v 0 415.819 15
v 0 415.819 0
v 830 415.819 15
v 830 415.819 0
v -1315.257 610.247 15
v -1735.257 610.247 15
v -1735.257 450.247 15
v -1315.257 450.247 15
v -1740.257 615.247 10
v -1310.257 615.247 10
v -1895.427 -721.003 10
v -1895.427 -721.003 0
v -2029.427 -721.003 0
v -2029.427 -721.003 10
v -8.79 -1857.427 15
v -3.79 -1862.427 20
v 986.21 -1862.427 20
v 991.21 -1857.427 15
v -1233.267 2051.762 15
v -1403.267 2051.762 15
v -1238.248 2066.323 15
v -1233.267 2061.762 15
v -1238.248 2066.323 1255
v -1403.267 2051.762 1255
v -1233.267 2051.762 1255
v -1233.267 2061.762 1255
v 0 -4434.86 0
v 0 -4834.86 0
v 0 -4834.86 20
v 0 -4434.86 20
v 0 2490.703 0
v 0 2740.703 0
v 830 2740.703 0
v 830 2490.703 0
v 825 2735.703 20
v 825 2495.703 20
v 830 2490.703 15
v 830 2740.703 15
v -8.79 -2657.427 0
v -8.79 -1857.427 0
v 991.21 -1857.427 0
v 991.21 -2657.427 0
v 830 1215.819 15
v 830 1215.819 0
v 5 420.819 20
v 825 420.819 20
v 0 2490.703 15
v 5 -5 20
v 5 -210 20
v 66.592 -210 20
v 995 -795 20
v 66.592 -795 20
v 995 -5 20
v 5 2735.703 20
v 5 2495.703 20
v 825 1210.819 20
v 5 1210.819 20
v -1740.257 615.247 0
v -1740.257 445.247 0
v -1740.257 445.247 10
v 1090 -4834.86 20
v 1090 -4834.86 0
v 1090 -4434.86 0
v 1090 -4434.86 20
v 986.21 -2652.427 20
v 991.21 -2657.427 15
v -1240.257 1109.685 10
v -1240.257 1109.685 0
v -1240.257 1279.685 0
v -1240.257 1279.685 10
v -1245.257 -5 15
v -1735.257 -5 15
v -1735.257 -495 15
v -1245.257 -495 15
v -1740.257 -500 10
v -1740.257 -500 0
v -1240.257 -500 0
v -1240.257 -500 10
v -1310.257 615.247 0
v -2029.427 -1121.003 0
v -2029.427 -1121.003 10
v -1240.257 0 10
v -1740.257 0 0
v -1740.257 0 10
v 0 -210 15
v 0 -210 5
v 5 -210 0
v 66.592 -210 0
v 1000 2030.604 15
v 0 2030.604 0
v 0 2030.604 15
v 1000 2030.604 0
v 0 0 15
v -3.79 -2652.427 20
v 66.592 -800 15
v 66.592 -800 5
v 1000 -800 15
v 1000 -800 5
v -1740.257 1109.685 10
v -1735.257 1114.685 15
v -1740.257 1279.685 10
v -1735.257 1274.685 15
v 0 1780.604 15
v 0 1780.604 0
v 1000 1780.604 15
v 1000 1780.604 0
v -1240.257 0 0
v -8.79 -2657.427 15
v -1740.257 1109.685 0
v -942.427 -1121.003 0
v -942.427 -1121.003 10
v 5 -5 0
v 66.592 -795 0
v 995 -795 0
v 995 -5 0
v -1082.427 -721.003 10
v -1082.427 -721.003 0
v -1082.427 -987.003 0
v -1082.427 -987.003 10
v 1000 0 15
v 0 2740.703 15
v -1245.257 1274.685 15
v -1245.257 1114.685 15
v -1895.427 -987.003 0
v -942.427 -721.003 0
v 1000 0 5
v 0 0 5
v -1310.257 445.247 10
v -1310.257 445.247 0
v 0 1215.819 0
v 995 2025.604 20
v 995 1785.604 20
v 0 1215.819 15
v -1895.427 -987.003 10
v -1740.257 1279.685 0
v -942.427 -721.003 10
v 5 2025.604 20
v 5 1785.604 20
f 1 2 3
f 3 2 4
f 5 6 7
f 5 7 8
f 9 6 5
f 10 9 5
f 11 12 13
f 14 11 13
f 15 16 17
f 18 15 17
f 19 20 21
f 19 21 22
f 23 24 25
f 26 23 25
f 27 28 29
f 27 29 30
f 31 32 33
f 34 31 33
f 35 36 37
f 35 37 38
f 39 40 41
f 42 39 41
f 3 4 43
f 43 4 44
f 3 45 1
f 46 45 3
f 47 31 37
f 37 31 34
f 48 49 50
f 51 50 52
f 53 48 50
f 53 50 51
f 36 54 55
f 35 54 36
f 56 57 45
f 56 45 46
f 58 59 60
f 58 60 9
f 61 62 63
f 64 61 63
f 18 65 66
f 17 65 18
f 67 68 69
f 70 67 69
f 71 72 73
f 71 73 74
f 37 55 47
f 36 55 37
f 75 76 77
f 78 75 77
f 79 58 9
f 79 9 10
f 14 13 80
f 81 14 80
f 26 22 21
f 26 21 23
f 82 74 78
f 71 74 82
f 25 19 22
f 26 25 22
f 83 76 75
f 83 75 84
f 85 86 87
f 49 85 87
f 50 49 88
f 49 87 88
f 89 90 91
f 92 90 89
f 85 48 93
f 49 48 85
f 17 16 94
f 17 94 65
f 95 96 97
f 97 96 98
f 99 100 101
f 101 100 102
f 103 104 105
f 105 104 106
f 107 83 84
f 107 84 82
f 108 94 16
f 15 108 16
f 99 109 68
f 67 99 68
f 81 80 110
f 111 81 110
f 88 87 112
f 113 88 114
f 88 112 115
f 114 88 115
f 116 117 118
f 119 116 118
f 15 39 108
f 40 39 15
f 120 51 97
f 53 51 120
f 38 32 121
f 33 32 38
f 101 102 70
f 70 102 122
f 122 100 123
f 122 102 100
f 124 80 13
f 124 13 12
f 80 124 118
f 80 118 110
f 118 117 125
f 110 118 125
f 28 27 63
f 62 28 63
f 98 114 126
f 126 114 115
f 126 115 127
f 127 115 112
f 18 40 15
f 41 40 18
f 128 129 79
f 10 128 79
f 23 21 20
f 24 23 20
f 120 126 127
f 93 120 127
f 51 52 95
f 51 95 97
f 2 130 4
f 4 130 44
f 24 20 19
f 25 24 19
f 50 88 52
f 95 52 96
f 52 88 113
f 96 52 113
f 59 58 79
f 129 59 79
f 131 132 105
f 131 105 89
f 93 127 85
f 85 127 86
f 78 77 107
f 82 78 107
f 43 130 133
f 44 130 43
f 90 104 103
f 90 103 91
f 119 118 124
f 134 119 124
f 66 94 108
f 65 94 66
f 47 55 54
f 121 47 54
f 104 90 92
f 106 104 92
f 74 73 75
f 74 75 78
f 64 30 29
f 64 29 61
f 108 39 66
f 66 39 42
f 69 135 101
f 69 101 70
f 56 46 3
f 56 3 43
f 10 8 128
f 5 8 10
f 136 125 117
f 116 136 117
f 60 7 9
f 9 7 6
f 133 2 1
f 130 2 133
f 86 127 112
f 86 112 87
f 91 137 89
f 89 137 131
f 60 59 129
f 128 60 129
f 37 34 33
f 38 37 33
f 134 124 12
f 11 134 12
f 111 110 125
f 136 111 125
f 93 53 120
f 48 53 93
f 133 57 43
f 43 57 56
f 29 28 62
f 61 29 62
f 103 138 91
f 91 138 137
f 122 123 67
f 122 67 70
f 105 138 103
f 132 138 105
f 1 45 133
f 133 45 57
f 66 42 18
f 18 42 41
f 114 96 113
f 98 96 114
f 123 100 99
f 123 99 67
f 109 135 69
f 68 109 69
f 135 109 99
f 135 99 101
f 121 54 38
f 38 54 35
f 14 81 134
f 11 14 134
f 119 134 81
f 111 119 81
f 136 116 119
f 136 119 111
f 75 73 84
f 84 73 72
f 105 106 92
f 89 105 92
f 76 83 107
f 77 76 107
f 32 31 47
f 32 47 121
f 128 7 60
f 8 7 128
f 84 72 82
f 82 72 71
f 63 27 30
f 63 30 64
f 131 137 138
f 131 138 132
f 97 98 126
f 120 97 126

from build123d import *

# Parameters (mm, degrees)
F1_DEPTH  = 20
F2_SIZE   = 5
F3_SIZE   = 5
F4_W      = 830
F4_H      = 800
F5_DEPTH  = 20
F6_W      = 1000
F6_H      = 250
F7_DEPTH  = 20
F8_SIZE   = 5
F9_SIZE   = 5
F10_W     = 830
F10_H     = 250
F11_DEPTH = 20
F12_SIZE  = 5
F13_W     = 1000
F13_H     = 800
F14_DEPTH = 20
F15_SIZE  = 5
F16_W     = 500
F16_H     = 500
F16_W_2   = 430
F16_H_2   = 170
F17_DEPTH = 15
F18_SIZE  = 5
F19_SIZE  = 5
F20_SIZE  = 5
F22_DEPTH = 1240
F23_SIZE  = 5
F25_DEPTH = 10
F26_W     = 1090
F26_H     = 400
F27_DEPTH = 20


with BuildPart() as f1:
    # F0 (on Top) → F1 (new body)
    with BuildSketch(Plane.XY):
        Polygon((1000, 0), (0, 0), (0, -210), (66.591531, -210), (66.591531, -800), (1000, -800), align=None)
    extrude(amount=F1_DEPTH)

    # F2
    f2_edges = [f1.edges().sort_by_distance(p)[0] for p in [
        (0, -105, 20),
        (500, 0, 20),
        (533.295766, -800, 20),
        (1000, -400, 20),
    ]]
    chamfer(f2_edges, length=F2_SIZE)

    # F3
    f3_edges = [f1.edges().sort_by_distance(p)[0] for p in [
        (1000, -400, 0),
        (533.295766, -800, 0),
        (0, -105, 0),
        (500, 0, 0),
    ]]
    chamfer(f3_edges, length=F3_SIZE)


with BuildPart() as f5:
    # F4 (on Top) → F5 (new body)
    with BuildSketch(Plane.XY):
        with Locations((415, 815.819019)):
            Rectangle(F4_W, F4_H)
    extrude(amount=F5_DEPTH)

    # F8
    f8_edges = [f5.edges().sort_by_distance(p)[0] for p in [
        (415, 1215.819019, 20),
        (0, 815.819019, 20),
        (415, 415.819019, 20),
        (830, 815.819019, 20),
    ]]
    chamfer(f8_edges, length=F8_SIZE)


with BuildPart() as f7:
    # F6 (on Top) → F7 (new body)
    with BuildSketch(Plane.XY):
        with Locations((500, 1905.604243)):
            Rectangle(F6_W, F6_H)
    extrude(amount=F7_DEPTH)

    # F9
    f9_edges = [f7.edges().sort_by_distance(p)[0] for p in [
        (1000, 1905.604243, 20),
        (500, 2030.604243, 20),
        (0, 1905.604243, 20),
        (500, 1780.604243, 20),
    ]]
    chamfer(f9_edges, length=F9_SIZE)


with BuildPart() as f11:
    # F10 (on Top) → F11 (new body)
    with BuildSketch(Plane.XY):
        with Locations((415, 2615.703106)):
            Rectangle(F10_W, F10_H)
    extrude(amount=F11_DEPTH)

    # F12
    f12_edges = [f11.edges().sort_by_distance(p)[0] for p in [
        (415, 2740.703106, 20),
        (0, 2615.703106, 20),
        (415, 2490.703106, 20),
        (830, 2615.703106, 20),
    ]]
    chamfer(f12_edges, length=F12_SIZE)


with BuildPart() as f14:
    # F13 (on Top) → F14 (new body)
    with BuildSketch(Plane.XY):
        with Locations((491.210267, -2257.426834)):
            Rectangle(F13_W, F13_H)
    extrude(amount=F14_DEPTH)

    # F15
    f15_edges = [f14.edges().sort_by_distance(p)[0] for p in [
        (491.210267, -1857.426834, 20),
        (-8.789733, -2257.426834, 20),
        (491.210267, -2657.426834, 20),
        (991.210267, -2257.426834, 20),
    ]]
    chamfer(f15_edges, length=F15_SIZE)


with BuildPart() as f17:
    # F16 (on Top) → F17 (new body)
    with BuildSketch(Plane.XY):
        with Locations((-1490.257263, -250)):
            Rectangle(F16_W, F16_H)
        with Locations((-1525.257263, 530.247024)):
            Rectangle(F16_W_2, F16_H_2)
        with Locations((-1490.257263, 1194.684825)):
            Rectangle(F16_W, F16_H_2)
    extrude(amount=F17_DEPTH)

    # F18
    f18_edges = [f17.edges().sort_by_distance(p)[0] for p in [
        (-1490.257263, 0, 15),
        (-1740.257263, -250, 15),
        (-1490.257263, -500, 15),
        (-1240.257263, -250, 15),
    ]]
    chamfer(f18_edges, length=F18_SIZE)

    # F19
    f19_edges = [f17.edges().sort_by_distance(p)[0] for p in [
        (-1490.257263, 1109.684825, 15),
        (-1740.257263, 1194.684825, 15),
        (-1490.257263, 1279.684825, 15),
        (-1240.257263, 1194.684825, 15),
    ]]
    chamfer(f19_edges, length=F19_SIZE)

    # F20
    f20_edges = [f17.edges().sort_by_distance(p)[0] for p in [
        (-1740.257263, 530.247024, 15),
        (-1525.257263, 615.247024, 15),
        (-1310.257263, 530.247024, 15),
        (-1525.257263, 445.247024, 15),
    ]]
    chamfer(f20_edges, length=F20_SIZE)


with BuildPart() as f22:
    # F21 (on face) → F22 (new body)
    with BuildSketch(Plane.XY.offset(15)):
        Polygon((-1233.267372, 2066.762457), (-1403.267372, 2051.762457), (-1233.267372, 2051.762457), align=None)
    extrude(amount=F22_DEPTH)

    # F23
    f23_edges = [f22.edges().sort_by_distance(p)[0] for p in [
        (-1233.267372, 2066.762457, 635),
    ]]
    chamfer(f23_edges, length=F23_SIZE)


with BuildPart() as f25:
    # F24 (on Top) → F25 (new body)
    with BuildSketch(Plane.XY):
        Polygon((-1895.427499, -721.002913), (-2029.427499, -721.002913), (-2029.427499, -1121.002913), (-942.427499, -1121.002913), (-942.427499, -721.002913), (-1082.427499, -721.002913), (-1082.427499, -987.002913), (-1895.427499, -987.002913), align=None)
    extrude(amount=F25_DEPTH)


with BuildPart() as f27:
    # F26 (on Top) → F27 (new body)
    with BuildSketch(Plane.XY):
        with Locations((545, -4634.860325)):
            Rectangle(F26_W, F26_H)
    extrude(amount=F27_DEPTH)


solid = Compound([f1.part, f5.part, f7.part, f11.part, f14.part, f17.part, f22.part, f25.part, f27.part])
